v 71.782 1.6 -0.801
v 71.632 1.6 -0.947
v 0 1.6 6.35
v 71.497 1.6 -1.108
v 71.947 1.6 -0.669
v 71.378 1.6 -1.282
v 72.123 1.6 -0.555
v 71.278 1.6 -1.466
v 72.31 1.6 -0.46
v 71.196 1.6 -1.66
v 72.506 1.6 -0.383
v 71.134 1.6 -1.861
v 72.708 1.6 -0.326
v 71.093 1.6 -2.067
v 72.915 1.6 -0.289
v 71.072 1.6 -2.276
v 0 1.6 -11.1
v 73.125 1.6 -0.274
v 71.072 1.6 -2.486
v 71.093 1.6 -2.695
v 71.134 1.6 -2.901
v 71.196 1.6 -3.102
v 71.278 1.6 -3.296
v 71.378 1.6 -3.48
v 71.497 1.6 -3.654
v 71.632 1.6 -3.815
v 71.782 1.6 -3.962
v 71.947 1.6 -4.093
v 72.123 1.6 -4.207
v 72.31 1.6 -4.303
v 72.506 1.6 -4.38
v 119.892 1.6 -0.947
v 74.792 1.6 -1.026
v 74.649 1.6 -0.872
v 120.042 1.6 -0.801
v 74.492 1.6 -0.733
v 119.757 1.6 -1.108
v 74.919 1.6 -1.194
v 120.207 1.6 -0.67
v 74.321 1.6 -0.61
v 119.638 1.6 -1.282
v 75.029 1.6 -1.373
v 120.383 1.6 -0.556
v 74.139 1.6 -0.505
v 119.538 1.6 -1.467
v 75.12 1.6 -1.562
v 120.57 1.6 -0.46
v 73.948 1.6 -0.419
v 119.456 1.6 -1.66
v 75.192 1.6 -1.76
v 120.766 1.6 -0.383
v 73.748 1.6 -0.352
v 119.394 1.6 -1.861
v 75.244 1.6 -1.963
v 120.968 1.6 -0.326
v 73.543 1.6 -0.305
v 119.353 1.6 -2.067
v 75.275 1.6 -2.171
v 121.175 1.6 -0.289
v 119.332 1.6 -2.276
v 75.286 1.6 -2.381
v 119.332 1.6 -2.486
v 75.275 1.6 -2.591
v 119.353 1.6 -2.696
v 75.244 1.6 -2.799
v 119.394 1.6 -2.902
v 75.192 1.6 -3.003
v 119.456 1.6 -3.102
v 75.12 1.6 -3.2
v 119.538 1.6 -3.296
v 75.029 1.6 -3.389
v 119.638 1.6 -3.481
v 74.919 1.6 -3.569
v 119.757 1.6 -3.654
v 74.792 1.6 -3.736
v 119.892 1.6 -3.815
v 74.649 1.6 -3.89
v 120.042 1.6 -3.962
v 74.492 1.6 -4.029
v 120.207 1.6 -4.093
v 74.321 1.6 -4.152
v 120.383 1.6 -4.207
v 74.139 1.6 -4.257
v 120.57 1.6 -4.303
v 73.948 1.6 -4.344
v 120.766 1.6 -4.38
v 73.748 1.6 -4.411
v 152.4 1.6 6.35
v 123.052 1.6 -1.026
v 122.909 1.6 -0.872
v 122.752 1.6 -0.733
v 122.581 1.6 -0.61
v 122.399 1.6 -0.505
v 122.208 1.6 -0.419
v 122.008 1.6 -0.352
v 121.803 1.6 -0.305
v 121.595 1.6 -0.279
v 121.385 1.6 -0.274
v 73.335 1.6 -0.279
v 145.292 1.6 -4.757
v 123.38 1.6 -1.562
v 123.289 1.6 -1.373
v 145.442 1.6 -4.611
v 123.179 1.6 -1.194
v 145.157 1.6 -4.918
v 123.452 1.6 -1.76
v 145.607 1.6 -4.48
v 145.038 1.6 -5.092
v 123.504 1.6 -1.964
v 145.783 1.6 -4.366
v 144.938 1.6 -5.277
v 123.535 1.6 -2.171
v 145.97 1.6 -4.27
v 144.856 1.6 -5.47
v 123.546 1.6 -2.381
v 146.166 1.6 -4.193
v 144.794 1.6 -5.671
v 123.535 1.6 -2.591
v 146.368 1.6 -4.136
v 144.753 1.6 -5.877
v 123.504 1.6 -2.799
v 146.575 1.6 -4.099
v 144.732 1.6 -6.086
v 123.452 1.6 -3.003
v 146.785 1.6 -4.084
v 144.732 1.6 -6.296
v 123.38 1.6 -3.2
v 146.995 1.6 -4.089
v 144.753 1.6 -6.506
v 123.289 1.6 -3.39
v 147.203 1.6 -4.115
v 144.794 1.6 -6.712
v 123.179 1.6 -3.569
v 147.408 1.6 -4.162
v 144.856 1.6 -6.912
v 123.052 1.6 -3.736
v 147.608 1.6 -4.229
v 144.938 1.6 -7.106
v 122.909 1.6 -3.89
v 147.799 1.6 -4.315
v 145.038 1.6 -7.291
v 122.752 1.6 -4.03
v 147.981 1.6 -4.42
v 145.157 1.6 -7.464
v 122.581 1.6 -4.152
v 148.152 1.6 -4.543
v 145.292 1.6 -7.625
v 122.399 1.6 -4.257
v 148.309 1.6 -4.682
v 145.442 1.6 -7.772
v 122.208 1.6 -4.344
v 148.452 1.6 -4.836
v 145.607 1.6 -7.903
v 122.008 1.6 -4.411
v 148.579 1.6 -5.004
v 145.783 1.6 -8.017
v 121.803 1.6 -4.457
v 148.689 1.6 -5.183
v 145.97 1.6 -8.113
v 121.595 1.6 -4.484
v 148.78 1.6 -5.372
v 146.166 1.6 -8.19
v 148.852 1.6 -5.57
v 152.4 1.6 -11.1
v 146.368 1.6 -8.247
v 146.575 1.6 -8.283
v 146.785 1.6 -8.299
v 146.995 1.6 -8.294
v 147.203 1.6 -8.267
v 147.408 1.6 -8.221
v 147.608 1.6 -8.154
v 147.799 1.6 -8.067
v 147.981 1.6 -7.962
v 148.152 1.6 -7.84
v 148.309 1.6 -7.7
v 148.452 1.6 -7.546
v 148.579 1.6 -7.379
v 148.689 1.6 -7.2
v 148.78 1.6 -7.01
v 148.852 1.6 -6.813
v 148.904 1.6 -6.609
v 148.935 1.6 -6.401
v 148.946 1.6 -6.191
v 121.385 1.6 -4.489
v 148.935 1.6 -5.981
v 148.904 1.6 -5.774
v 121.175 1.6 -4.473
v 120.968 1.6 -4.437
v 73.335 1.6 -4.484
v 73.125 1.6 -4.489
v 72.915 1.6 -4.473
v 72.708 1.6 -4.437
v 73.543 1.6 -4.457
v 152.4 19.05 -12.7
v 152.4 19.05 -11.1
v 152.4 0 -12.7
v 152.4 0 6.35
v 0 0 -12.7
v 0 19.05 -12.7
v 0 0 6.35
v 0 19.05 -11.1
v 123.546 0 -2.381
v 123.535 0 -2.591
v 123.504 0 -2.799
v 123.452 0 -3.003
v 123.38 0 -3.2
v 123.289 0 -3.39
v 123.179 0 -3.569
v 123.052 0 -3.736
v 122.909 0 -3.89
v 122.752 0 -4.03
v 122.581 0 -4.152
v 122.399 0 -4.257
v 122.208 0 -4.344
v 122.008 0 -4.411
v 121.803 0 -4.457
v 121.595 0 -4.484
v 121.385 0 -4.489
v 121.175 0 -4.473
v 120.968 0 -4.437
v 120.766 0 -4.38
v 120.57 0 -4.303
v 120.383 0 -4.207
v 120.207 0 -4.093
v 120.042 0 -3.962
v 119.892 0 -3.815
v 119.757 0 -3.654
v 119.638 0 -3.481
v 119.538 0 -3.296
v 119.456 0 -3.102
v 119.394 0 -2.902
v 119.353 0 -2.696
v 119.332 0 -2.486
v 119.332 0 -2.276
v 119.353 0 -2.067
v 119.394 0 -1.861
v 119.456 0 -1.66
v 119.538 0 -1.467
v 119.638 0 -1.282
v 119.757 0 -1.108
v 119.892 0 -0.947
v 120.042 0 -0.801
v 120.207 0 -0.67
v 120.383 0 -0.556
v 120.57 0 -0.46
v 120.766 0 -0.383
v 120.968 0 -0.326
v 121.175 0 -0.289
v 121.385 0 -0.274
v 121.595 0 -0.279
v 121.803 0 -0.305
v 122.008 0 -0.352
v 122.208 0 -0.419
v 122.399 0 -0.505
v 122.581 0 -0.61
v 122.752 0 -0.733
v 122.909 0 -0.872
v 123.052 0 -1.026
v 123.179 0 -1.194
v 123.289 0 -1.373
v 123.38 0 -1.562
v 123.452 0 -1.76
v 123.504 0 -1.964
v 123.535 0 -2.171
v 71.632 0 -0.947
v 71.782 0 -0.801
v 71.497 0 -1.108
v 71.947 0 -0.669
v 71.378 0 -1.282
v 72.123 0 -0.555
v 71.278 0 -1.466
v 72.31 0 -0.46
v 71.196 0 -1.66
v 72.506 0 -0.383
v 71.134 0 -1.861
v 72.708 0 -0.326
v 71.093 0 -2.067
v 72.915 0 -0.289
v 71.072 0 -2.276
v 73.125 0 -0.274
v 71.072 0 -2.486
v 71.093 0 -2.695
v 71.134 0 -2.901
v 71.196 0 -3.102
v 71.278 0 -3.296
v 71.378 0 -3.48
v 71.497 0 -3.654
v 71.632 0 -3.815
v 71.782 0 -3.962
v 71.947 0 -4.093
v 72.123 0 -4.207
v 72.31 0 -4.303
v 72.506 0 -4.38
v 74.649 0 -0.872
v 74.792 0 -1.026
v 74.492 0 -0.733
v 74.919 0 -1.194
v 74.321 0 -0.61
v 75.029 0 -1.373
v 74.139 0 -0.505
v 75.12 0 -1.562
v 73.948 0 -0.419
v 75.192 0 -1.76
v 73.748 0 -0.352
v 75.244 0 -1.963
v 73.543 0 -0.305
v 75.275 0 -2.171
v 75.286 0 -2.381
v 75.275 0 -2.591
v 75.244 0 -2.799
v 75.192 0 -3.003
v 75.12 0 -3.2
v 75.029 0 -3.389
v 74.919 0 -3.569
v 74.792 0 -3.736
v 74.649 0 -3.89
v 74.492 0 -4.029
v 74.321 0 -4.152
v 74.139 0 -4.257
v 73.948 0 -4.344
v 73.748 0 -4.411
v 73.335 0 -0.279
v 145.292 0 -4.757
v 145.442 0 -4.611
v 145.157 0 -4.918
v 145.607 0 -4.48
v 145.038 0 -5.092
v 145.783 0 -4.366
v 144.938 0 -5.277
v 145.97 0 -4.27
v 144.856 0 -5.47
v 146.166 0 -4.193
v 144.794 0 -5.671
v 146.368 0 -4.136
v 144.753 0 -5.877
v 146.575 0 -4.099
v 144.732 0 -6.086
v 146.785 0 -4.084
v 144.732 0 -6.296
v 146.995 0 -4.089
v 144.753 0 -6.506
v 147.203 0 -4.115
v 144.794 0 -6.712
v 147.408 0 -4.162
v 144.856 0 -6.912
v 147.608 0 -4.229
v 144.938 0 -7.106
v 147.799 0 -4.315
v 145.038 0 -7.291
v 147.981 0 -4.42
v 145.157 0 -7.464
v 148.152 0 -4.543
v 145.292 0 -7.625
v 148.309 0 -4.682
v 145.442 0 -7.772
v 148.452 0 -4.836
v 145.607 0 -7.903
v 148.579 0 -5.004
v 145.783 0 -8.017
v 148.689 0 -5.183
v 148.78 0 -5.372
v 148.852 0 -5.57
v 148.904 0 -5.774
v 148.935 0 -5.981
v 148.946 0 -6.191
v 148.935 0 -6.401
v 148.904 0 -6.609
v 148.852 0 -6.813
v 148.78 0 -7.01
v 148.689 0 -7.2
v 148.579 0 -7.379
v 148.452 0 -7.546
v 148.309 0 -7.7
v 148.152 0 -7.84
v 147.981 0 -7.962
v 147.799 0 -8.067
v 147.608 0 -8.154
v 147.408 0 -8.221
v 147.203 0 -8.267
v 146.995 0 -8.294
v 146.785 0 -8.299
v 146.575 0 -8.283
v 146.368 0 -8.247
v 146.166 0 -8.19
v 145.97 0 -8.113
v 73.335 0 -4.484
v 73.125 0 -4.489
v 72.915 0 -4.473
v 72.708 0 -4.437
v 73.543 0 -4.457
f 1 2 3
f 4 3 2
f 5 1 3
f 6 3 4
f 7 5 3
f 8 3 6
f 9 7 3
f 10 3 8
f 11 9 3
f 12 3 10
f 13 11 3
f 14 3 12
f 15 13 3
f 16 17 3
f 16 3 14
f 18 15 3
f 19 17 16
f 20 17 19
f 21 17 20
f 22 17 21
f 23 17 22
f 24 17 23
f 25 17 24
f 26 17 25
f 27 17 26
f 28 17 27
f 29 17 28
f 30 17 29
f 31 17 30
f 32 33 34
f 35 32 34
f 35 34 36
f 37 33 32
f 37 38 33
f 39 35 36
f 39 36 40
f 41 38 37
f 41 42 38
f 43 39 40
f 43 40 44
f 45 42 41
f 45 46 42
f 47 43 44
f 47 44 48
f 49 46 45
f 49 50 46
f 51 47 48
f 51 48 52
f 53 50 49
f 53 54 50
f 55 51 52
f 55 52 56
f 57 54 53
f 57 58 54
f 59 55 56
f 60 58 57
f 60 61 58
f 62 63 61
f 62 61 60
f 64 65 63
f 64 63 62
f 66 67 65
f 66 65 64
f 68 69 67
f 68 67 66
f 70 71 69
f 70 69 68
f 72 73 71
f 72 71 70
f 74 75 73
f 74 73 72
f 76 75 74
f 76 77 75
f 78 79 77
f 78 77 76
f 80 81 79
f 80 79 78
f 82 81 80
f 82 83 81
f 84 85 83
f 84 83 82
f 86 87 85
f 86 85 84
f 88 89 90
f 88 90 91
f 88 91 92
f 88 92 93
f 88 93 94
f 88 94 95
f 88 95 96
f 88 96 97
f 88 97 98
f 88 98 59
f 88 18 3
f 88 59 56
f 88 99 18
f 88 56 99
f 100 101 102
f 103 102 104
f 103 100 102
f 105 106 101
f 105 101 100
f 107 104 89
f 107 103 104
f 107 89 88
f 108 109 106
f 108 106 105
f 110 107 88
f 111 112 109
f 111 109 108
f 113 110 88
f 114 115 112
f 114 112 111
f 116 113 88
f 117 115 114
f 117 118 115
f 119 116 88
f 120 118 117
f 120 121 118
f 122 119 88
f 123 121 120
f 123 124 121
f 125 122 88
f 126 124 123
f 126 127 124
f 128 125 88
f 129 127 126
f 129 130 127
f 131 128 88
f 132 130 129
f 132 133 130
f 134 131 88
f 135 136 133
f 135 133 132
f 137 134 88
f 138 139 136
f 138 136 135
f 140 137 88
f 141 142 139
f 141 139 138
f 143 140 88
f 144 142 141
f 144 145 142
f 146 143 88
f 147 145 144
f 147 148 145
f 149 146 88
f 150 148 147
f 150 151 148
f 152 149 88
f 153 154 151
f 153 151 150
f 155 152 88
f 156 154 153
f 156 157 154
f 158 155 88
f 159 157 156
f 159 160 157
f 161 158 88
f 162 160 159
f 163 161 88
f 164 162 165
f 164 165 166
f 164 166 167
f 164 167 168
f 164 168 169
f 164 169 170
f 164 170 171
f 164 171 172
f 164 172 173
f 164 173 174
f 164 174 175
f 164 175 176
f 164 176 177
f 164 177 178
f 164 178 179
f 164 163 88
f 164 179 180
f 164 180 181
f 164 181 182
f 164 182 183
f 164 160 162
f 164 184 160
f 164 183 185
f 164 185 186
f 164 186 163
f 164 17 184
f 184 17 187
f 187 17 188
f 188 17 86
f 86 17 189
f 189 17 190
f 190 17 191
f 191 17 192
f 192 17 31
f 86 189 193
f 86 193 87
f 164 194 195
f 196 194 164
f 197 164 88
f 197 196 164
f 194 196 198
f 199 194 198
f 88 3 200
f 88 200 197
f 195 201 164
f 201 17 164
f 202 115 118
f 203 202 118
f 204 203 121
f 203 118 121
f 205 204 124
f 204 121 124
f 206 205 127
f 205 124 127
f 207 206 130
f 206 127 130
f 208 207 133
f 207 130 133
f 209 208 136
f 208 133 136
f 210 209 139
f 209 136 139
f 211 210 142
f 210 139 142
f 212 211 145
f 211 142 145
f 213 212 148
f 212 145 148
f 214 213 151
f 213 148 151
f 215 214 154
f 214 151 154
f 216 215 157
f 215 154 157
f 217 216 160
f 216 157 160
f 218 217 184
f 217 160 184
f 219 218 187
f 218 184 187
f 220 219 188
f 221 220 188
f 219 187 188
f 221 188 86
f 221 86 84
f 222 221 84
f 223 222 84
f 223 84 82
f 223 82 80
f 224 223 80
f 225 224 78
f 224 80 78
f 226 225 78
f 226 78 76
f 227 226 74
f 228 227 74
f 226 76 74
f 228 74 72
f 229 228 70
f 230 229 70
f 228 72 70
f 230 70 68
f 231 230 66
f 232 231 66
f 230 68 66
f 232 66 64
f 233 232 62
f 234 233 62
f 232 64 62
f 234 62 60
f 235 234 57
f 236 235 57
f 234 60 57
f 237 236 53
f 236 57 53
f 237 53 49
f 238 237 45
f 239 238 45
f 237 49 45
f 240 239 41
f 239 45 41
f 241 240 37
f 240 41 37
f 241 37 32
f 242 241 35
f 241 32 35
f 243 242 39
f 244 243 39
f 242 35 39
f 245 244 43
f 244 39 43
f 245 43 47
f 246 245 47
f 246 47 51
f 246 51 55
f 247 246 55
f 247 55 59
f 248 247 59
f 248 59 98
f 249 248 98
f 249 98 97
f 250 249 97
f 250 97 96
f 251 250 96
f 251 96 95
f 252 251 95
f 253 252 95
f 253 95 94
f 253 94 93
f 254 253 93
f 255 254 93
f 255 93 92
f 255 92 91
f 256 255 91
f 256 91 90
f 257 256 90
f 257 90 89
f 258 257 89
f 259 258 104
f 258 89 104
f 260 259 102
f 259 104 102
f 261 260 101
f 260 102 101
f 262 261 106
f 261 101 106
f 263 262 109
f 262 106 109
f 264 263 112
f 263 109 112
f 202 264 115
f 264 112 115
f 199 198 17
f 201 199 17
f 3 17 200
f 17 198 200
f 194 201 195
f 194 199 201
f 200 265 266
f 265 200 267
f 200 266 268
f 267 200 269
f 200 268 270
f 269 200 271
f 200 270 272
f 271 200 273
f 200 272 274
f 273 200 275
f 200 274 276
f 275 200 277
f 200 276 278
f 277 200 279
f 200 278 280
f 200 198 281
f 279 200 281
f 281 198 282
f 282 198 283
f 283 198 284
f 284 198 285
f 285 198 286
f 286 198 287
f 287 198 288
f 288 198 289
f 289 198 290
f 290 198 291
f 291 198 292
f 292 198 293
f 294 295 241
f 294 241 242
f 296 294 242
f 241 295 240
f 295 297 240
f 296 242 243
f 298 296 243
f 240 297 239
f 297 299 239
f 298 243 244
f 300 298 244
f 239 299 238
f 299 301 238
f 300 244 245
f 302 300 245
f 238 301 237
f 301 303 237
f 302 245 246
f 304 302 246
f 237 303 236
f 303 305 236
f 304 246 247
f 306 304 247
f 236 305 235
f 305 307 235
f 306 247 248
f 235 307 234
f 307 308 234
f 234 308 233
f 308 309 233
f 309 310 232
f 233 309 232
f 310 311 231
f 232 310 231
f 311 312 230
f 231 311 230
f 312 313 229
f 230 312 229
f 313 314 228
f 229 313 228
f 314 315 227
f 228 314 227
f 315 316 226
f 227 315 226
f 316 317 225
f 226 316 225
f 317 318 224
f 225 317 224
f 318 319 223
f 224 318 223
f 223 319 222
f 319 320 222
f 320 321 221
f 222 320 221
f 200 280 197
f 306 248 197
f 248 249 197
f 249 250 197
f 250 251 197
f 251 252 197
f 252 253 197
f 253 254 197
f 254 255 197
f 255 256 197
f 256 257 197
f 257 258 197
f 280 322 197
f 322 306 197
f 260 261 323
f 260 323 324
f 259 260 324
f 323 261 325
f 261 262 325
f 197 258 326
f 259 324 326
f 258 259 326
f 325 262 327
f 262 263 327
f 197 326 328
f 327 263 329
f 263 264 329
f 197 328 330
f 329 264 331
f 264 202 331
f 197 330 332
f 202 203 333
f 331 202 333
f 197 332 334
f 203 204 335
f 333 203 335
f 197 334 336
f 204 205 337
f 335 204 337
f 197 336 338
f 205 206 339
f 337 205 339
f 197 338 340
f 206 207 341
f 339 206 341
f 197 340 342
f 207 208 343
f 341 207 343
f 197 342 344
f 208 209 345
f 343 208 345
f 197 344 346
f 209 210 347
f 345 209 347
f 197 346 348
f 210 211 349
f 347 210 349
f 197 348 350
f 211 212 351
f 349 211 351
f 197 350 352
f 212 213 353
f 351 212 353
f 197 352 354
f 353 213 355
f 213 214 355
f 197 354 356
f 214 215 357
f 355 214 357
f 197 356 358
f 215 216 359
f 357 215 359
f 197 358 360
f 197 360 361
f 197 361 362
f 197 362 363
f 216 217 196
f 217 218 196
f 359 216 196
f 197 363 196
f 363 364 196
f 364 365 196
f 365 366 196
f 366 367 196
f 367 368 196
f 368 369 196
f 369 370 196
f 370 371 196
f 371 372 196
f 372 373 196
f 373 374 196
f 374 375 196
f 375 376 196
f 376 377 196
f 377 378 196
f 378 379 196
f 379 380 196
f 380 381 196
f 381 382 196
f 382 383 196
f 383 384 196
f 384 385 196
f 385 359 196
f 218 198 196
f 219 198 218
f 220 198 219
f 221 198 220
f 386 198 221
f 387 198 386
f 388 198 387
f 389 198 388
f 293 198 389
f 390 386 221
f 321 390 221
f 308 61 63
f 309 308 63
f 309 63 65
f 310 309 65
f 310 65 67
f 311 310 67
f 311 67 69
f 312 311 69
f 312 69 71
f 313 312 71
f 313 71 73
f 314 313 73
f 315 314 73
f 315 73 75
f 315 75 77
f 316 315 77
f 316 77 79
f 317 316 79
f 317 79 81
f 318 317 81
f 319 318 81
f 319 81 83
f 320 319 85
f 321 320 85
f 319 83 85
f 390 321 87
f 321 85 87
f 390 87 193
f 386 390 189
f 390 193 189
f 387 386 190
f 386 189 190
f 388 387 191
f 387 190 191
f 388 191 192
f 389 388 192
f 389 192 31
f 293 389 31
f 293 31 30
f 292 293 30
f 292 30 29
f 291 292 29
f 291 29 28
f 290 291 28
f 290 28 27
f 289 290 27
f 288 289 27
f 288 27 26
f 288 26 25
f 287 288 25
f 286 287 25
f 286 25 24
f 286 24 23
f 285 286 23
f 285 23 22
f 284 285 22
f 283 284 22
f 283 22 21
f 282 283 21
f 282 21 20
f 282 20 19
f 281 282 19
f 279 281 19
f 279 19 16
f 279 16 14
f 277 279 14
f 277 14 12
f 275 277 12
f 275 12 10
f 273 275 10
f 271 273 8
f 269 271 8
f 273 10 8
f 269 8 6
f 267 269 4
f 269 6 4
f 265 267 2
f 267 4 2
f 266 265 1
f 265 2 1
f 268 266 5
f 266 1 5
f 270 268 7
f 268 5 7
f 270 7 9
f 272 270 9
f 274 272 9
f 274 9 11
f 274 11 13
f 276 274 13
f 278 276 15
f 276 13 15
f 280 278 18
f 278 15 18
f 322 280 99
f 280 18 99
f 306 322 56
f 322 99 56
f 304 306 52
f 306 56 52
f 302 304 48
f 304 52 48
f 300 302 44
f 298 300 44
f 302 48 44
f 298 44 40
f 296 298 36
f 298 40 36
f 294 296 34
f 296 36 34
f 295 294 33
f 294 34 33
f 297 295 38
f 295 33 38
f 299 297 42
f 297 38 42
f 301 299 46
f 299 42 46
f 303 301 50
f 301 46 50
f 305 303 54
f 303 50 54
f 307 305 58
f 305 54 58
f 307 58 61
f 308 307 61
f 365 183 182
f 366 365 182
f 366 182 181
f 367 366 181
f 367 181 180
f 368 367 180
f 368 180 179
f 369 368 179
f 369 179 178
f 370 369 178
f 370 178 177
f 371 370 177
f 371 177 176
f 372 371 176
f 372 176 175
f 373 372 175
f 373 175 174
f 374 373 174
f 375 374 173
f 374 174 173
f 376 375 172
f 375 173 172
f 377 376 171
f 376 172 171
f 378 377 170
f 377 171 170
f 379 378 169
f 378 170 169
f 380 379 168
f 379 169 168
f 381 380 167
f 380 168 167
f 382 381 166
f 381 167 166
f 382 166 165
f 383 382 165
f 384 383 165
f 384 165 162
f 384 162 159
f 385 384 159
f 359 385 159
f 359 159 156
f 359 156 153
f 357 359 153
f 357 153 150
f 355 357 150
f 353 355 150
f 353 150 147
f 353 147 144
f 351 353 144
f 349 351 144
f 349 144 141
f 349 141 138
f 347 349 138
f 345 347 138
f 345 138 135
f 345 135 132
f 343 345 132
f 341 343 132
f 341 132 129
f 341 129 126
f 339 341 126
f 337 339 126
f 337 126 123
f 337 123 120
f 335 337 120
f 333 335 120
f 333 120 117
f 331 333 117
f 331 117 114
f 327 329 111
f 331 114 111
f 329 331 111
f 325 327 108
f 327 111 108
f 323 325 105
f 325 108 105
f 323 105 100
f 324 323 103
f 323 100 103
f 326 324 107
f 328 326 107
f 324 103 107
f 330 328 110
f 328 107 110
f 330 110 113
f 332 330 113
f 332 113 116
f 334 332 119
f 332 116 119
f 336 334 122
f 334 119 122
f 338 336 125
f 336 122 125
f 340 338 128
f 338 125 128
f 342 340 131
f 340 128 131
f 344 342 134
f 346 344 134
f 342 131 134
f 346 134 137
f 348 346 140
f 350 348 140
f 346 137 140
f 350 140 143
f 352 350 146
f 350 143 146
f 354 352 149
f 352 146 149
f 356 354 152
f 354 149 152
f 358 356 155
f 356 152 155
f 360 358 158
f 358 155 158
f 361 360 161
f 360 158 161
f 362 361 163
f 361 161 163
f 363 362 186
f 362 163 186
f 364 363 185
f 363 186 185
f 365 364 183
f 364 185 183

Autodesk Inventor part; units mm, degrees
ref_plane "YZ Plane" through (0, 0, 0) normal (1, 0, 0) x (0, 1, 0)
ref_plane "XZ Plane" through (0, 0, 0) normal (0, 1, 0) x (-1, 0, 0)
ref_plane "XY Plane" through (0, 0, 0) normal (0, 0, 1) x (1, 0, 0)
sketch "Sketch1" plane through (0, 0, 0) normal (1, 0, 0) x (0, 1, 0)
  line L0 (0, 0) -> (1.6002, 0)
  line L1 (1.6002, 0) -> (1.6002, -12.7)
  line L2 (1.6002, -12.7) -> (0, -12.7)
  line L3 (0, -12.7) -> (0, 0)
  line L4 (0, -12.7) -> (0, -11.0998)
  line L5 (0, -11.0998) -> (12.7, -11.0998)
  line L6 (12.7, -11.0998) -> (12.7, -12.7)
  line L7 (12.7, -12.7) -> (0, -12.7)
  line L8 (0, -12.7) -> (0, -11.0998)
  point P0 (1.6002, -11.0998)
  dimension "d0" = 1.6002
  dimension "d1" = 12.7
  dimension "d2" = 1.6002
  dimension "d3" = 12.7
extrude "Extrusion1" add sketch "Sketch1" along normal blind 152.4
sketch "Sketch4" plane through (0, 0, 0) normal (0, 0, 1) x (1, 0, 0)
  line L0 (0, 1.6002) -> (152.4, 1.6002) projected
  line L1 (0, 0) -> (152.4, 0)
  line L2 (152.4, 0) -> (152.4, 1.6002)
  line L3 (152.4, 1.6002) -> (0, 1.6002)
  line L4 (0, 1.6002) -> (0, 0)
extrude "Extrusion4" add sketch "Sketch4" along normal blind 6.35
sketch "Sketch5" plane through (0, 12.7, -11.0998) normal (0, 1, 0) x (1, 0, 0)
  line L0 (0, 0) -> (152.4, 0) projected
  line L1 (152.4, 1.6002) -> (152.4, -17.4498) projected
  line L2 (0, 0) -> (152.4, 0)
  line L3 (152.4, 0) -> (152.4, 1.6002)
  line L4 (152.4, 1.6002) -> (0, 1.6002)
  line L5 (0, 1.6002) -> (0, 0)
  point P0 (0, -11.0998)
extrude "Extrusion5" add sketch "Sketch5" along normal blind 6.35
sketch "Sketch6" plane through (0, 1.6002, -11.0998) normal (0, 1, 0) x (1, 0, 0)
  point P0 (0, -11.0998)
sketch "Sketch7" plane through (0, 1.6002, -11.0998) normal (0, 1, 0) x (1, 0, 0)
  line L0 (152.4, 1.6002) -> (152.4, -17.4498) projected
  line L1 (152.4, -17.4498) -> (152.4, 0.0127)
  line L2 (152.4, -8.7185) -> (146.8374, -8.7185)
  line L3 (146.8374, -8.7185) -> (121.4374, -8.7185)
  circle A0 centre (121.4374, -8.7185) radius 2.1082
  line L4 (121.4374, -8.7185) -> (73.1774, -8.7186)
  circle A1 centre (73.1774, -8.7186) radius 2.1082
  line L5 (146.8374, -8.7185) -> (146.8374, -4.9085)
  circle A2 centre (146.8374, -4.9085) radius 2.1082
  point P0 (0, -11.0998)
  dimension "d19" = 17.4625
  dimension "d20" = 5.5626
  dimension "d22" = 25.4
  dimension "d23" = 48.26
  dimension "d24" = 4.2164
  dimension "d27" = 3.81
  dimension "d28" = 4.2164
extrude "Extrusion6" cut sketch "Sketch7" against normal blind 25.4
properties part number "wing"
